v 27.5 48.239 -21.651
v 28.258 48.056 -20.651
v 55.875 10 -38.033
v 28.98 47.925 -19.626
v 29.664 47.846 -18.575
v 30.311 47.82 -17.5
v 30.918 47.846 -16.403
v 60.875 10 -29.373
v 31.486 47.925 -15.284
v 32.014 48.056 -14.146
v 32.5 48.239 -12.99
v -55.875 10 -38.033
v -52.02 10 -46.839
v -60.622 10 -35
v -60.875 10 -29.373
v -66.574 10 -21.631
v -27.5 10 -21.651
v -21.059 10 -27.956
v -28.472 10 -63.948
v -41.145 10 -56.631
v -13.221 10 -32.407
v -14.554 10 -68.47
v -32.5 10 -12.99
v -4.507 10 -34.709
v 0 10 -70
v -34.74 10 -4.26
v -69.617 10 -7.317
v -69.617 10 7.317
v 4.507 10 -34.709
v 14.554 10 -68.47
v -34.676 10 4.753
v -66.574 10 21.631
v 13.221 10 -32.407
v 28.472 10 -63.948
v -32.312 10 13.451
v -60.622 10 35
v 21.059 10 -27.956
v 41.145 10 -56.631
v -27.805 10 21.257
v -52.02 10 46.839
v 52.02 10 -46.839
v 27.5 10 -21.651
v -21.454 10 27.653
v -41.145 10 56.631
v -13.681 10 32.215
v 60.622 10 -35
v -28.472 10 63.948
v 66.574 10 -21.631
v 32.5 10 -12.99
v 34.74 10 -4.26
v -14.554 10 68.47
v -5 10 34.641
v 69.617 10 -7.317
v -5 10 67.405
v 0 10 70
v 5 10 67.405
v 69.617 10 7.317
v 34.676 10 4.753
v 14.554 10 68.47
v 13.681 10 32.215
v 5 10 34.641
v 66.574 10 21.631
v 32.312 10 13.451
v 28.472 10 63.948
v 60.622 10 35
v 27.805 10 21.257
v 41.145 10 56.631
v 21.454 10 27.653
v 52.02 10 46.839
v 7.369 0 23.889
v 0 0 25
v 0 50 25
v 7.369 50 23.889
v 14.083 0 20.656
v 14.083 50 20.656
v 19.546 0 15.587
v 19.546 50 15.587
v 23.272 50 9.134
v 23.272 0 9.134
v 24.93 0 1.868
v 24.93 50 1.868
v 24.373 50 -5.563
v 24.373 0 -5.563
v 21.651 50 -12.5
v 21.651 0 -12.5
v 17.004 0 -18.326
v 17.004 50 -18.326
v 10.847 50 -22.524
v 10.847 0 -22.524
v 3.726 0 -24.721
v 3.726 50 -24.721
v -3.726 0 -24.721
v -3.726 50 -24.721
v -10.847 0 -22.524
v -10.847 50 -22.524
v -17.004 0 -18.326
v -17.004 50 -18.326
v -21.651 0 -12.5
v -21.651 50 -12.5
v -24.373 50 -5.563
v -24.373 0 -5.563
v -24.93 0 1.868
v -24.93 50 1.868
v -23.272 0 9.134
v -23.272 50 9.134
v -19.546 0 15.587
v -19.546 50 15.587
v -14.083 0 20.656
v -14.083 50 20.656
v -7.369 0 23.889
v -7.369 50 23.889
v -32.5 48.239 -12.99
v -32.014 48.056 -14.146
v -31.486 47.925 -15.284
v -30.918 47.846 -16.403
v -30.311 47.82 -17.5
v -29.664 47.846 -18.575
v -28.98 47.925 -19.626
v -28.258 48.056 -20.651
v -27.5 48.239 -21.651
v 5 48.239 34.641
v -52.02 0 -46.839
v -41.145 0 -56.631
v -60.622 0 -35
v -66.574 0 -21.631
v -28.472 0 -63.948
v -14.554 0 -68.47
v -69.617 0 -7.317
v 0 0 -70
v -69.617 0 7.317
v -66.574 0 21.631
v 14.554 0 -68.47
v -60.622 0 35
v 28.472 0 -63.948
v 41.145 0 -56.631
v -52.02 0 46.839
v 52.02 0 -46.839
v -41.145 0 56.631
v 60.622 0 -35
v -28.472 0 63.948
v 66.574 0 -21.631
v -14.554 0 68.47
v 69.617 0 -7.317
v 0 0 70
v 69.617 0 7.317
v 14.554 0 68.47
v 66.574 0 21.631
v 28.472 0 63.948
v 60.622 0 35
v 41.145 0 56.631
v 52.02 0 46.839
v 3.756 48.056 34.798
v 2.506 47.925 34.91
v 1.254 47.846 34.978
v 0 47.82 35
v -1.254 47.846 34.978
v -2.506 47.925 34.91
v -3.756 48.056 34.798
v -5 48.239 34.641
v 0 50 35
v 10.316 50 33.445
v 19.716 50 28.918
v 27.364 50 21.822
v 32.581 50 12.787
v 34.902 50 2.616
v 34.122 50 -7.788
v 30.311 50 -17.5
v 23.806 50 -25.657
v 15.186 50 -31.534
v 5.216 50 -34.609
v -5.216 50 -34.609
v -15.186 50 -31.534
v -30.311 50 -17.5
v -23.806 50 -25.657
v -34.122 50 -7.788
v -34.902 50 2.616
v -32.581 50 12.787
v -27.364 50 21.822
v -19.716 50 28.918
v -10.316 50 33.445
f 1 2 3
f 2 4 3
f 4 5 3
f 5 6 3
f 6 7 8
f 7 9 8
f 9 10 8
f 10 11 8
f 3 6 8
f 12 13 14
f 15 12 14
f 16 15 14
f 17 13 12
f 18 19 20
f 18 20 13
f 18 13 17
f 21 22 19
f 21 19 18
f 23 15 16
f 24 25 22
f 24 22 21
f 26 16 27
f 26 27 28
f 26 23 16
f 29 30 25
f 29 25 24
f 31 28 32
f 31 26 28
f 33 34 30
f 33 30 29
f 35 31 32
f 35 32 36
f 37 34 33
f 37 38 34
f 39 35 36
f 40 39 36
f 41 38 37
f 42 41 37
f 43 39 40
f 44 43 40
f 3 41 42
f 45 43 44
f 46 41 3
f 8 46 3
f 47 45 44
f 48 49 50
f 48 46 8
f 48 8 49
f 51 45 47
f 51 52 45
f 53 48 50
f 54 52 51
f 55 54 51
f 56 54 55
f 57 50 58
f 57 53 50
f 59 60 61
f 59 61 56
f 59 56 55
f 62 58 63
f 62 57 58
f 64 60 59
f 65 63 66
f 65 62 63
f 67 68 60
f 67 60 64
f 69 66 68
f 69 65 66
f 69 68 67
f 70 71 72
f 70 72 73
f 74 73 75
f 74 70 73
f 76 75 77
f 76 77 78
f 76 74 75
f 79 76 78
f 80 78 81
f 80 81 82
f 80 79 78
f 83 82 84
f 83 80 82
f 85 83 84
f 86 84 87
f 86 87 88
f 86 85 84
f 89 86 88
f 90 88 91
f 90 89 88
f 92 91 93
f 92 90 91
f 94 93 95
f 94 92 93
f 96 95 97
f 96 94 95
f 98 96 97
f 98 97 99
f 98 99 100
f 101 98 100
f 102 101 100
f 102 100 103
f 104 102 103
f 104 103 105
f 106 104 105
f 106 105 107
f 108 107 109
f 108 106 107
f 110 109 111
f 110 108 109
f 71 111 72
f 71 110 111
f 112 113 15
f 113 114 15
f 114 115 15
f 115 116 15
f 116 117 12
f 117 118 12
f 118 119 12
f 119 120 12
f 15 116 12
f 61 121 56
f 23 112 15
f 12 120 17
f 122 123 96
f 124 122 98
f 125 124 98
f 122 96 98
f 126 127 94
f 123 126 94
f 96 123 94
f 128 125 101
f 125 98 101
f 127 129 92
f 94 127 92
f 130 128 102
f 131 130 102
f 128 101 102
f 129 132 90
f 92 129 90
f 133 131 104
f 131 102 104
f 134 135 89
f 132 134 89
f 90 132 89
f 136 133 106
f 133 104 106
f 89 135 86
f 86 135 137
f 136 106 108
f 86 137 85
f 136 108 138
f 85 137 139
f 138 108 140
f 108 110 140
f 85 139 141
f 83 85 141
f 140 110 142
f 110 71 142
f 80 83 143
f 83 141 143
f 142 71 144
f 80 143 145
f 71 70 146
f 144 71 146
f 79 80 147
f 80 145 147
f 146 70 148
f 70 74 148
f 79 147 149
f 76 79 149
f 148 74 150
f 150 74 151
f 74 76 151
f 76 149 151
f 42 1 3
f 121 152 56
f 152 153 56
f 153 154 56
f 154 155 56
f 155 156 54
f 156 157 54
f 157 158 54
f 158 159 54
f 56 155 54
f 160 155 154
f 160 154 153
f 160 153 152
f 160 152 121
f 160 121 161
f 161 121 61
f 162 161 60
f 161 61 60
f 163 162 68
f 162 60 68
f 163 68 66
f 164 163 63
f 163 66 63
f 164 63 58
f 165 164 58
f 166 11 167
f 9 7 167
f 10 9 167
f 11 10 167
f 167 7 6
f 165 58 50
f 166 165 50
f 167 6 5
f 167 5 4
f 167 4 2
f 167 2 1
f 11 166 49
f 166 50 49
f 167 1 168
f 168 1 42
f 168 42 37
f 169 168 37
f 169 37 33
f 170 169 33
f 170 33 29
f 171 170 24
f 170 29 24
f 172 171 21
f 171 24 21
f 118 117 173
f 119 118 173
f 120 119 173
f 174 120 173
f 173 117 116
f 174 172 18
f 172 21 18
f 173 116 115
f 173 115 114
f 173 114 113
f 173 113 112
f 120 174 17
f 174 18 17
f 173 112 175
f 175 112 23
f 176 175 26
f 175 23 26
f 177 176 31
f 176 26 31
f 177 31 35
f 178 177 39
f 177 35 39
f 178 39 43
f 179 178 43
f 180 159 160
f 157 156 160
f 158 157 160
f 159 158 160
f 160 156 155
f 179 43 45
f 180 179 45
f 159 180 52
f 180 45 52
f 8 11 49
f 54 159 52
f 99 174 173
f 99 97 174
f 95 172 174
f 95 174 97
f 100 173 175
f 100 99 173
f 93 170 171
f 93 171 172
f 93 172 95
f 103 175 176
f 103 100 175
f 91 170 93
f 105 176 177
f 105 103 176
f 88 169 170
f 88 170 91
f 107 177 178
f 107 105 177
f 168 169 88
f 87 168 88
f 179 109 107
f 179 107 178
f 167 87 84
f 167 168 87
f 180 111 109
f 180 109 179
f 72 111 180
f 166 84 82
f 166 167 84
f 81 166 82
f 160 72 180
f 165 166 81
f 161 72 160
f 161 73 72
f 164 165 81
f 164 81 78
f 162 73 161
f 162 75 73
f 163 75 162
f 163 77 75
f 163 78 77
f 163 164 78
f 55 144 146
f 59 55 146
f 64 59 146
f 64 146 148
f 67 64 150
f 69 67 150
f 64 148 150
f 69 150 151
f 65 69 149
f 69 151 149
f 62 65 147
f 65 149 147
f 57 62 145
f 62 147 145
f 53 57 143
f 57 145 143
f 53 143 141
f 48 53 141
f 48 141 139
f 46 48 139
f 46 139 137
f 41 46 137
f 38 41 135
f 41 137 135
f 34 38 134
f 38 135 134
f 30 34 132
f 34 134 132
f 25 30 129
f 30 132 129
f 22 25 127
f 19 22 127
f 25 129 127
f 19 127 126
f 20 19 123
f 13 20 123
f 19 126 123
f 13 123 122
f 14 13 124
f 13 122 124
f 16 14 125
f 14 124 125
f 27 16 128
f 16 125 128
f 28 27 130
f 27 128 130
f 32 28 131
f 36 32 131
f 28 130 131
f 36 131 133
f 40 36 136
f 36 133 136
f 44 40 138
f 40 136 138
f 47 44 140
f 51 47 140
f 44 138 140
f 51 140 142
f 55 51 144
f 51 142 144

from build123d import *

# Parameters (mm, degrees)
SKETCH_1_R               = 70
SKETCH_1_R_2             = 35
EXTRUDE_1_DEPTH          = 10
SKETCH_1_3_R             = 35
SKETCH_1_3_R_2           = 25
EXTRUDE_2_DEPTH          = 50
RIB_13_REACH             = 112.905
SKETCH_2_WALL_W          = 273.614682576
SKETCH_2_WALL_H          = 10
PATTERN_CIRCULAR_1_COUNT = 3


with BuildPart() as part:
    # 草图1 → 凸台-拉伸1 (new body)
    with BuildSketch(Plane(origin=(0, 0, 0), x_dir=(1, 0, 0), z_dir=(0, 1, 0))):
        Circle(SKETCH_1_R)
        Circle(SKETCH_1_R_2, mode=Mode.SUBTRACT)
    extrude(amount=EXTRUDE_1_DEPTH)

    # 草图1<3> → 凸台-拉伸2 (add)
    with BuildSketch(Plane(origin=(0, 0, 0), x_dir=(1, 0, 0), z_dir=(0, 1, 0))):
        Circle(SKETCH_1_3_R)
        Circle(SKETCH_1_3_R_2, mode=Mode.SUBTRACT)
    extrude(amount=EXTRUDE_2_DEPTH)

    # 草图2 wall → 筋13 (add, up to next)
    with BuildSketch(Plane(origin=(0, 28.909855829, 51.202647079), x_dir=(0, -0.7593716924, 0.650657077716), z_dir=(0, -0.650657077716, -0.7593716924)), mode=Mode.PRIVATE) as rib_13_sk1:
        Rectangle(SKETCH_2_WALL_W, SKETCH_2_WALL_H)
    rib_13_tool1 = extrude(rib_13_sk1.sketch, amount=RIB_13_REACH, mode=Mode.PRIVATE) - part.part
    rib_13 = rib_13_tool1.solids().sort_by_distance((0, 28.909855829, 51.202647079))[0]
    add(rib_13)

    # 阵列(圆周)1: 筋13 ×3 about axis
    pattern_circular_1_axis = Axis((0, 50, 0), (0, -1, 0))
    for i in range(1, PATTERN_CIRCULAR_1_COUNT):
        add(rib_13.rotate(pattern_circular_1_axis, i * 360 / PATTERN_CIRCULAR_1_COUNT))


solid = part.part
